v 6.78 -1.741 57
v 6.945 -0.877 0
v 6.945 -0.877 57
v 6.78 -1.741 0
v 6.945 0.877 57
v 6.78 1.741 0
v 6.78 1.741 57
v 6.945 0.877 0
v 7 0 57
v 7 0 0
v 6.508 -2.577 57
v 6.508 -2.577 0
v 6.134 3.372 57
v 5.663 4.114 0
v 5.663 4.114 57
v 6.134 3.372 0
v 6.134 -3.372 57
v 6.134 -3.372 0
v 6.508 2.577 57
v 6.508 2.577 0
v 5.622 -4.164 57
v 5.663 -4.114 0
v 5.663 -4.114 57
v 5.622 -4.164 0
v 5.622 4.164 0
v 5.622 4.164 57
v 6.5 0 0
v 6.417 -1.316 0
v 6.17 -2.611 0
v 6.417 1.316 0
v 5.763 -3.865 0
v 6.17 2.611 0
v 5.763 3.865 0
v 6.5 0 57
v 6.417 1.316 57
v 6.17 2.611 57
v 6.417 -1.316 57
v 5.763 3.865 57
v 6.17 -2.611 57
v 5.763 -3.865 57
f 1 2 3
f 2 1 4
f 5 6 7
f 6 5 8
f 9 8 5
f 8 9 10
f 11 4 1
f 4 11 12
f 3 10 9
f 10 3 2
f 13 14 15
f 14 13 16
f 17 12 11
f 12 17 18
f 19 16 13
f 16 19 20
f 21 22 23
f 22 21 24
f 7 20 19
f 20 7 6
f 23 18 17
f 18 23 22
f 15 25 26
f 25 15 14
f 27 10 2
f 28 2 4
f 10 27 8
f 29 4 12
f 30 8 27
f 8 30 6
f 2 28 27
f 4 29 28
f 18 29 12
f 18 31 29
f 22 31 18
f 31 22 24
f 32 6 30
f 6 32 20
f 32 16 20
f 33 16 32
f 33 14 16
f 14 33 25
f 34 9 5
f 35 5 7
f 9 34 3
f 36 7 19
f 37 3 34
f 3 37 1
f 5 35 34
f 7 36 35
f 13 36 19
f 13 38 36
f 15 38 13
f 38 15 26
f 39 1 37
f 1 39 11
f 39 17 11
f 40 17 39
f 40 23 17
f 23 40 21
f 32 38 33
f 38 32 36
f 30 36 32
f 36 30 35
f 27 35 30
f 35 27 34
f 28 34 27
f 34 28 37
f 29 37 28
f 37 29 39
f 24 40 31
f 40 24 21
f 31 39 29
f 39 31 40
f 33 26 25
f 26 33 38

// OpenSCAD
$fn = 50;


difference() {
	union() {
		cylinder(h = 57, r = 7.0000000000);
		translate(v = [-7.0000000000, 0, 0]) {
			cylinder(h = 57, r = 7.0000000000);
		}
	}
	union() {
		cylinder(h = 57, r = 3.2500000000);
		cylinder(h = 57, r = 1.8000000000);
		cylinder(h = 57, r = 1.8000000000);
		cylinder(h = 57, r = 1.8000000000);
		translate(v = [-11.5000000000, 0, 0]) {
			hull() {
				translate(v = [-3.7500000000, 0.0000000000, 0]) {
					cylinder(h = 57, r = 10.5000000000);
				}
				translate(v = [3.7500000000, 0.0000000000, 0]) {
					cylinder(h = 57, r = 10.5000000000);
				}
				translate(v = [-3.7500000000, -0.0000000000, 0]) {
					cylinder(h = 57, r = 10.5000000000);
				}
				translate(v = [3.7500000000, -0.0000000000, 0]) {
					cylinder(h = 57, r = 10.5000000000);
				}
			}
		}
		translate(v = [-4.0000000000, 0, 0.0000000000]) {
			cylinder(h = 57, r = 10.5000000000);
		}
	}
}
